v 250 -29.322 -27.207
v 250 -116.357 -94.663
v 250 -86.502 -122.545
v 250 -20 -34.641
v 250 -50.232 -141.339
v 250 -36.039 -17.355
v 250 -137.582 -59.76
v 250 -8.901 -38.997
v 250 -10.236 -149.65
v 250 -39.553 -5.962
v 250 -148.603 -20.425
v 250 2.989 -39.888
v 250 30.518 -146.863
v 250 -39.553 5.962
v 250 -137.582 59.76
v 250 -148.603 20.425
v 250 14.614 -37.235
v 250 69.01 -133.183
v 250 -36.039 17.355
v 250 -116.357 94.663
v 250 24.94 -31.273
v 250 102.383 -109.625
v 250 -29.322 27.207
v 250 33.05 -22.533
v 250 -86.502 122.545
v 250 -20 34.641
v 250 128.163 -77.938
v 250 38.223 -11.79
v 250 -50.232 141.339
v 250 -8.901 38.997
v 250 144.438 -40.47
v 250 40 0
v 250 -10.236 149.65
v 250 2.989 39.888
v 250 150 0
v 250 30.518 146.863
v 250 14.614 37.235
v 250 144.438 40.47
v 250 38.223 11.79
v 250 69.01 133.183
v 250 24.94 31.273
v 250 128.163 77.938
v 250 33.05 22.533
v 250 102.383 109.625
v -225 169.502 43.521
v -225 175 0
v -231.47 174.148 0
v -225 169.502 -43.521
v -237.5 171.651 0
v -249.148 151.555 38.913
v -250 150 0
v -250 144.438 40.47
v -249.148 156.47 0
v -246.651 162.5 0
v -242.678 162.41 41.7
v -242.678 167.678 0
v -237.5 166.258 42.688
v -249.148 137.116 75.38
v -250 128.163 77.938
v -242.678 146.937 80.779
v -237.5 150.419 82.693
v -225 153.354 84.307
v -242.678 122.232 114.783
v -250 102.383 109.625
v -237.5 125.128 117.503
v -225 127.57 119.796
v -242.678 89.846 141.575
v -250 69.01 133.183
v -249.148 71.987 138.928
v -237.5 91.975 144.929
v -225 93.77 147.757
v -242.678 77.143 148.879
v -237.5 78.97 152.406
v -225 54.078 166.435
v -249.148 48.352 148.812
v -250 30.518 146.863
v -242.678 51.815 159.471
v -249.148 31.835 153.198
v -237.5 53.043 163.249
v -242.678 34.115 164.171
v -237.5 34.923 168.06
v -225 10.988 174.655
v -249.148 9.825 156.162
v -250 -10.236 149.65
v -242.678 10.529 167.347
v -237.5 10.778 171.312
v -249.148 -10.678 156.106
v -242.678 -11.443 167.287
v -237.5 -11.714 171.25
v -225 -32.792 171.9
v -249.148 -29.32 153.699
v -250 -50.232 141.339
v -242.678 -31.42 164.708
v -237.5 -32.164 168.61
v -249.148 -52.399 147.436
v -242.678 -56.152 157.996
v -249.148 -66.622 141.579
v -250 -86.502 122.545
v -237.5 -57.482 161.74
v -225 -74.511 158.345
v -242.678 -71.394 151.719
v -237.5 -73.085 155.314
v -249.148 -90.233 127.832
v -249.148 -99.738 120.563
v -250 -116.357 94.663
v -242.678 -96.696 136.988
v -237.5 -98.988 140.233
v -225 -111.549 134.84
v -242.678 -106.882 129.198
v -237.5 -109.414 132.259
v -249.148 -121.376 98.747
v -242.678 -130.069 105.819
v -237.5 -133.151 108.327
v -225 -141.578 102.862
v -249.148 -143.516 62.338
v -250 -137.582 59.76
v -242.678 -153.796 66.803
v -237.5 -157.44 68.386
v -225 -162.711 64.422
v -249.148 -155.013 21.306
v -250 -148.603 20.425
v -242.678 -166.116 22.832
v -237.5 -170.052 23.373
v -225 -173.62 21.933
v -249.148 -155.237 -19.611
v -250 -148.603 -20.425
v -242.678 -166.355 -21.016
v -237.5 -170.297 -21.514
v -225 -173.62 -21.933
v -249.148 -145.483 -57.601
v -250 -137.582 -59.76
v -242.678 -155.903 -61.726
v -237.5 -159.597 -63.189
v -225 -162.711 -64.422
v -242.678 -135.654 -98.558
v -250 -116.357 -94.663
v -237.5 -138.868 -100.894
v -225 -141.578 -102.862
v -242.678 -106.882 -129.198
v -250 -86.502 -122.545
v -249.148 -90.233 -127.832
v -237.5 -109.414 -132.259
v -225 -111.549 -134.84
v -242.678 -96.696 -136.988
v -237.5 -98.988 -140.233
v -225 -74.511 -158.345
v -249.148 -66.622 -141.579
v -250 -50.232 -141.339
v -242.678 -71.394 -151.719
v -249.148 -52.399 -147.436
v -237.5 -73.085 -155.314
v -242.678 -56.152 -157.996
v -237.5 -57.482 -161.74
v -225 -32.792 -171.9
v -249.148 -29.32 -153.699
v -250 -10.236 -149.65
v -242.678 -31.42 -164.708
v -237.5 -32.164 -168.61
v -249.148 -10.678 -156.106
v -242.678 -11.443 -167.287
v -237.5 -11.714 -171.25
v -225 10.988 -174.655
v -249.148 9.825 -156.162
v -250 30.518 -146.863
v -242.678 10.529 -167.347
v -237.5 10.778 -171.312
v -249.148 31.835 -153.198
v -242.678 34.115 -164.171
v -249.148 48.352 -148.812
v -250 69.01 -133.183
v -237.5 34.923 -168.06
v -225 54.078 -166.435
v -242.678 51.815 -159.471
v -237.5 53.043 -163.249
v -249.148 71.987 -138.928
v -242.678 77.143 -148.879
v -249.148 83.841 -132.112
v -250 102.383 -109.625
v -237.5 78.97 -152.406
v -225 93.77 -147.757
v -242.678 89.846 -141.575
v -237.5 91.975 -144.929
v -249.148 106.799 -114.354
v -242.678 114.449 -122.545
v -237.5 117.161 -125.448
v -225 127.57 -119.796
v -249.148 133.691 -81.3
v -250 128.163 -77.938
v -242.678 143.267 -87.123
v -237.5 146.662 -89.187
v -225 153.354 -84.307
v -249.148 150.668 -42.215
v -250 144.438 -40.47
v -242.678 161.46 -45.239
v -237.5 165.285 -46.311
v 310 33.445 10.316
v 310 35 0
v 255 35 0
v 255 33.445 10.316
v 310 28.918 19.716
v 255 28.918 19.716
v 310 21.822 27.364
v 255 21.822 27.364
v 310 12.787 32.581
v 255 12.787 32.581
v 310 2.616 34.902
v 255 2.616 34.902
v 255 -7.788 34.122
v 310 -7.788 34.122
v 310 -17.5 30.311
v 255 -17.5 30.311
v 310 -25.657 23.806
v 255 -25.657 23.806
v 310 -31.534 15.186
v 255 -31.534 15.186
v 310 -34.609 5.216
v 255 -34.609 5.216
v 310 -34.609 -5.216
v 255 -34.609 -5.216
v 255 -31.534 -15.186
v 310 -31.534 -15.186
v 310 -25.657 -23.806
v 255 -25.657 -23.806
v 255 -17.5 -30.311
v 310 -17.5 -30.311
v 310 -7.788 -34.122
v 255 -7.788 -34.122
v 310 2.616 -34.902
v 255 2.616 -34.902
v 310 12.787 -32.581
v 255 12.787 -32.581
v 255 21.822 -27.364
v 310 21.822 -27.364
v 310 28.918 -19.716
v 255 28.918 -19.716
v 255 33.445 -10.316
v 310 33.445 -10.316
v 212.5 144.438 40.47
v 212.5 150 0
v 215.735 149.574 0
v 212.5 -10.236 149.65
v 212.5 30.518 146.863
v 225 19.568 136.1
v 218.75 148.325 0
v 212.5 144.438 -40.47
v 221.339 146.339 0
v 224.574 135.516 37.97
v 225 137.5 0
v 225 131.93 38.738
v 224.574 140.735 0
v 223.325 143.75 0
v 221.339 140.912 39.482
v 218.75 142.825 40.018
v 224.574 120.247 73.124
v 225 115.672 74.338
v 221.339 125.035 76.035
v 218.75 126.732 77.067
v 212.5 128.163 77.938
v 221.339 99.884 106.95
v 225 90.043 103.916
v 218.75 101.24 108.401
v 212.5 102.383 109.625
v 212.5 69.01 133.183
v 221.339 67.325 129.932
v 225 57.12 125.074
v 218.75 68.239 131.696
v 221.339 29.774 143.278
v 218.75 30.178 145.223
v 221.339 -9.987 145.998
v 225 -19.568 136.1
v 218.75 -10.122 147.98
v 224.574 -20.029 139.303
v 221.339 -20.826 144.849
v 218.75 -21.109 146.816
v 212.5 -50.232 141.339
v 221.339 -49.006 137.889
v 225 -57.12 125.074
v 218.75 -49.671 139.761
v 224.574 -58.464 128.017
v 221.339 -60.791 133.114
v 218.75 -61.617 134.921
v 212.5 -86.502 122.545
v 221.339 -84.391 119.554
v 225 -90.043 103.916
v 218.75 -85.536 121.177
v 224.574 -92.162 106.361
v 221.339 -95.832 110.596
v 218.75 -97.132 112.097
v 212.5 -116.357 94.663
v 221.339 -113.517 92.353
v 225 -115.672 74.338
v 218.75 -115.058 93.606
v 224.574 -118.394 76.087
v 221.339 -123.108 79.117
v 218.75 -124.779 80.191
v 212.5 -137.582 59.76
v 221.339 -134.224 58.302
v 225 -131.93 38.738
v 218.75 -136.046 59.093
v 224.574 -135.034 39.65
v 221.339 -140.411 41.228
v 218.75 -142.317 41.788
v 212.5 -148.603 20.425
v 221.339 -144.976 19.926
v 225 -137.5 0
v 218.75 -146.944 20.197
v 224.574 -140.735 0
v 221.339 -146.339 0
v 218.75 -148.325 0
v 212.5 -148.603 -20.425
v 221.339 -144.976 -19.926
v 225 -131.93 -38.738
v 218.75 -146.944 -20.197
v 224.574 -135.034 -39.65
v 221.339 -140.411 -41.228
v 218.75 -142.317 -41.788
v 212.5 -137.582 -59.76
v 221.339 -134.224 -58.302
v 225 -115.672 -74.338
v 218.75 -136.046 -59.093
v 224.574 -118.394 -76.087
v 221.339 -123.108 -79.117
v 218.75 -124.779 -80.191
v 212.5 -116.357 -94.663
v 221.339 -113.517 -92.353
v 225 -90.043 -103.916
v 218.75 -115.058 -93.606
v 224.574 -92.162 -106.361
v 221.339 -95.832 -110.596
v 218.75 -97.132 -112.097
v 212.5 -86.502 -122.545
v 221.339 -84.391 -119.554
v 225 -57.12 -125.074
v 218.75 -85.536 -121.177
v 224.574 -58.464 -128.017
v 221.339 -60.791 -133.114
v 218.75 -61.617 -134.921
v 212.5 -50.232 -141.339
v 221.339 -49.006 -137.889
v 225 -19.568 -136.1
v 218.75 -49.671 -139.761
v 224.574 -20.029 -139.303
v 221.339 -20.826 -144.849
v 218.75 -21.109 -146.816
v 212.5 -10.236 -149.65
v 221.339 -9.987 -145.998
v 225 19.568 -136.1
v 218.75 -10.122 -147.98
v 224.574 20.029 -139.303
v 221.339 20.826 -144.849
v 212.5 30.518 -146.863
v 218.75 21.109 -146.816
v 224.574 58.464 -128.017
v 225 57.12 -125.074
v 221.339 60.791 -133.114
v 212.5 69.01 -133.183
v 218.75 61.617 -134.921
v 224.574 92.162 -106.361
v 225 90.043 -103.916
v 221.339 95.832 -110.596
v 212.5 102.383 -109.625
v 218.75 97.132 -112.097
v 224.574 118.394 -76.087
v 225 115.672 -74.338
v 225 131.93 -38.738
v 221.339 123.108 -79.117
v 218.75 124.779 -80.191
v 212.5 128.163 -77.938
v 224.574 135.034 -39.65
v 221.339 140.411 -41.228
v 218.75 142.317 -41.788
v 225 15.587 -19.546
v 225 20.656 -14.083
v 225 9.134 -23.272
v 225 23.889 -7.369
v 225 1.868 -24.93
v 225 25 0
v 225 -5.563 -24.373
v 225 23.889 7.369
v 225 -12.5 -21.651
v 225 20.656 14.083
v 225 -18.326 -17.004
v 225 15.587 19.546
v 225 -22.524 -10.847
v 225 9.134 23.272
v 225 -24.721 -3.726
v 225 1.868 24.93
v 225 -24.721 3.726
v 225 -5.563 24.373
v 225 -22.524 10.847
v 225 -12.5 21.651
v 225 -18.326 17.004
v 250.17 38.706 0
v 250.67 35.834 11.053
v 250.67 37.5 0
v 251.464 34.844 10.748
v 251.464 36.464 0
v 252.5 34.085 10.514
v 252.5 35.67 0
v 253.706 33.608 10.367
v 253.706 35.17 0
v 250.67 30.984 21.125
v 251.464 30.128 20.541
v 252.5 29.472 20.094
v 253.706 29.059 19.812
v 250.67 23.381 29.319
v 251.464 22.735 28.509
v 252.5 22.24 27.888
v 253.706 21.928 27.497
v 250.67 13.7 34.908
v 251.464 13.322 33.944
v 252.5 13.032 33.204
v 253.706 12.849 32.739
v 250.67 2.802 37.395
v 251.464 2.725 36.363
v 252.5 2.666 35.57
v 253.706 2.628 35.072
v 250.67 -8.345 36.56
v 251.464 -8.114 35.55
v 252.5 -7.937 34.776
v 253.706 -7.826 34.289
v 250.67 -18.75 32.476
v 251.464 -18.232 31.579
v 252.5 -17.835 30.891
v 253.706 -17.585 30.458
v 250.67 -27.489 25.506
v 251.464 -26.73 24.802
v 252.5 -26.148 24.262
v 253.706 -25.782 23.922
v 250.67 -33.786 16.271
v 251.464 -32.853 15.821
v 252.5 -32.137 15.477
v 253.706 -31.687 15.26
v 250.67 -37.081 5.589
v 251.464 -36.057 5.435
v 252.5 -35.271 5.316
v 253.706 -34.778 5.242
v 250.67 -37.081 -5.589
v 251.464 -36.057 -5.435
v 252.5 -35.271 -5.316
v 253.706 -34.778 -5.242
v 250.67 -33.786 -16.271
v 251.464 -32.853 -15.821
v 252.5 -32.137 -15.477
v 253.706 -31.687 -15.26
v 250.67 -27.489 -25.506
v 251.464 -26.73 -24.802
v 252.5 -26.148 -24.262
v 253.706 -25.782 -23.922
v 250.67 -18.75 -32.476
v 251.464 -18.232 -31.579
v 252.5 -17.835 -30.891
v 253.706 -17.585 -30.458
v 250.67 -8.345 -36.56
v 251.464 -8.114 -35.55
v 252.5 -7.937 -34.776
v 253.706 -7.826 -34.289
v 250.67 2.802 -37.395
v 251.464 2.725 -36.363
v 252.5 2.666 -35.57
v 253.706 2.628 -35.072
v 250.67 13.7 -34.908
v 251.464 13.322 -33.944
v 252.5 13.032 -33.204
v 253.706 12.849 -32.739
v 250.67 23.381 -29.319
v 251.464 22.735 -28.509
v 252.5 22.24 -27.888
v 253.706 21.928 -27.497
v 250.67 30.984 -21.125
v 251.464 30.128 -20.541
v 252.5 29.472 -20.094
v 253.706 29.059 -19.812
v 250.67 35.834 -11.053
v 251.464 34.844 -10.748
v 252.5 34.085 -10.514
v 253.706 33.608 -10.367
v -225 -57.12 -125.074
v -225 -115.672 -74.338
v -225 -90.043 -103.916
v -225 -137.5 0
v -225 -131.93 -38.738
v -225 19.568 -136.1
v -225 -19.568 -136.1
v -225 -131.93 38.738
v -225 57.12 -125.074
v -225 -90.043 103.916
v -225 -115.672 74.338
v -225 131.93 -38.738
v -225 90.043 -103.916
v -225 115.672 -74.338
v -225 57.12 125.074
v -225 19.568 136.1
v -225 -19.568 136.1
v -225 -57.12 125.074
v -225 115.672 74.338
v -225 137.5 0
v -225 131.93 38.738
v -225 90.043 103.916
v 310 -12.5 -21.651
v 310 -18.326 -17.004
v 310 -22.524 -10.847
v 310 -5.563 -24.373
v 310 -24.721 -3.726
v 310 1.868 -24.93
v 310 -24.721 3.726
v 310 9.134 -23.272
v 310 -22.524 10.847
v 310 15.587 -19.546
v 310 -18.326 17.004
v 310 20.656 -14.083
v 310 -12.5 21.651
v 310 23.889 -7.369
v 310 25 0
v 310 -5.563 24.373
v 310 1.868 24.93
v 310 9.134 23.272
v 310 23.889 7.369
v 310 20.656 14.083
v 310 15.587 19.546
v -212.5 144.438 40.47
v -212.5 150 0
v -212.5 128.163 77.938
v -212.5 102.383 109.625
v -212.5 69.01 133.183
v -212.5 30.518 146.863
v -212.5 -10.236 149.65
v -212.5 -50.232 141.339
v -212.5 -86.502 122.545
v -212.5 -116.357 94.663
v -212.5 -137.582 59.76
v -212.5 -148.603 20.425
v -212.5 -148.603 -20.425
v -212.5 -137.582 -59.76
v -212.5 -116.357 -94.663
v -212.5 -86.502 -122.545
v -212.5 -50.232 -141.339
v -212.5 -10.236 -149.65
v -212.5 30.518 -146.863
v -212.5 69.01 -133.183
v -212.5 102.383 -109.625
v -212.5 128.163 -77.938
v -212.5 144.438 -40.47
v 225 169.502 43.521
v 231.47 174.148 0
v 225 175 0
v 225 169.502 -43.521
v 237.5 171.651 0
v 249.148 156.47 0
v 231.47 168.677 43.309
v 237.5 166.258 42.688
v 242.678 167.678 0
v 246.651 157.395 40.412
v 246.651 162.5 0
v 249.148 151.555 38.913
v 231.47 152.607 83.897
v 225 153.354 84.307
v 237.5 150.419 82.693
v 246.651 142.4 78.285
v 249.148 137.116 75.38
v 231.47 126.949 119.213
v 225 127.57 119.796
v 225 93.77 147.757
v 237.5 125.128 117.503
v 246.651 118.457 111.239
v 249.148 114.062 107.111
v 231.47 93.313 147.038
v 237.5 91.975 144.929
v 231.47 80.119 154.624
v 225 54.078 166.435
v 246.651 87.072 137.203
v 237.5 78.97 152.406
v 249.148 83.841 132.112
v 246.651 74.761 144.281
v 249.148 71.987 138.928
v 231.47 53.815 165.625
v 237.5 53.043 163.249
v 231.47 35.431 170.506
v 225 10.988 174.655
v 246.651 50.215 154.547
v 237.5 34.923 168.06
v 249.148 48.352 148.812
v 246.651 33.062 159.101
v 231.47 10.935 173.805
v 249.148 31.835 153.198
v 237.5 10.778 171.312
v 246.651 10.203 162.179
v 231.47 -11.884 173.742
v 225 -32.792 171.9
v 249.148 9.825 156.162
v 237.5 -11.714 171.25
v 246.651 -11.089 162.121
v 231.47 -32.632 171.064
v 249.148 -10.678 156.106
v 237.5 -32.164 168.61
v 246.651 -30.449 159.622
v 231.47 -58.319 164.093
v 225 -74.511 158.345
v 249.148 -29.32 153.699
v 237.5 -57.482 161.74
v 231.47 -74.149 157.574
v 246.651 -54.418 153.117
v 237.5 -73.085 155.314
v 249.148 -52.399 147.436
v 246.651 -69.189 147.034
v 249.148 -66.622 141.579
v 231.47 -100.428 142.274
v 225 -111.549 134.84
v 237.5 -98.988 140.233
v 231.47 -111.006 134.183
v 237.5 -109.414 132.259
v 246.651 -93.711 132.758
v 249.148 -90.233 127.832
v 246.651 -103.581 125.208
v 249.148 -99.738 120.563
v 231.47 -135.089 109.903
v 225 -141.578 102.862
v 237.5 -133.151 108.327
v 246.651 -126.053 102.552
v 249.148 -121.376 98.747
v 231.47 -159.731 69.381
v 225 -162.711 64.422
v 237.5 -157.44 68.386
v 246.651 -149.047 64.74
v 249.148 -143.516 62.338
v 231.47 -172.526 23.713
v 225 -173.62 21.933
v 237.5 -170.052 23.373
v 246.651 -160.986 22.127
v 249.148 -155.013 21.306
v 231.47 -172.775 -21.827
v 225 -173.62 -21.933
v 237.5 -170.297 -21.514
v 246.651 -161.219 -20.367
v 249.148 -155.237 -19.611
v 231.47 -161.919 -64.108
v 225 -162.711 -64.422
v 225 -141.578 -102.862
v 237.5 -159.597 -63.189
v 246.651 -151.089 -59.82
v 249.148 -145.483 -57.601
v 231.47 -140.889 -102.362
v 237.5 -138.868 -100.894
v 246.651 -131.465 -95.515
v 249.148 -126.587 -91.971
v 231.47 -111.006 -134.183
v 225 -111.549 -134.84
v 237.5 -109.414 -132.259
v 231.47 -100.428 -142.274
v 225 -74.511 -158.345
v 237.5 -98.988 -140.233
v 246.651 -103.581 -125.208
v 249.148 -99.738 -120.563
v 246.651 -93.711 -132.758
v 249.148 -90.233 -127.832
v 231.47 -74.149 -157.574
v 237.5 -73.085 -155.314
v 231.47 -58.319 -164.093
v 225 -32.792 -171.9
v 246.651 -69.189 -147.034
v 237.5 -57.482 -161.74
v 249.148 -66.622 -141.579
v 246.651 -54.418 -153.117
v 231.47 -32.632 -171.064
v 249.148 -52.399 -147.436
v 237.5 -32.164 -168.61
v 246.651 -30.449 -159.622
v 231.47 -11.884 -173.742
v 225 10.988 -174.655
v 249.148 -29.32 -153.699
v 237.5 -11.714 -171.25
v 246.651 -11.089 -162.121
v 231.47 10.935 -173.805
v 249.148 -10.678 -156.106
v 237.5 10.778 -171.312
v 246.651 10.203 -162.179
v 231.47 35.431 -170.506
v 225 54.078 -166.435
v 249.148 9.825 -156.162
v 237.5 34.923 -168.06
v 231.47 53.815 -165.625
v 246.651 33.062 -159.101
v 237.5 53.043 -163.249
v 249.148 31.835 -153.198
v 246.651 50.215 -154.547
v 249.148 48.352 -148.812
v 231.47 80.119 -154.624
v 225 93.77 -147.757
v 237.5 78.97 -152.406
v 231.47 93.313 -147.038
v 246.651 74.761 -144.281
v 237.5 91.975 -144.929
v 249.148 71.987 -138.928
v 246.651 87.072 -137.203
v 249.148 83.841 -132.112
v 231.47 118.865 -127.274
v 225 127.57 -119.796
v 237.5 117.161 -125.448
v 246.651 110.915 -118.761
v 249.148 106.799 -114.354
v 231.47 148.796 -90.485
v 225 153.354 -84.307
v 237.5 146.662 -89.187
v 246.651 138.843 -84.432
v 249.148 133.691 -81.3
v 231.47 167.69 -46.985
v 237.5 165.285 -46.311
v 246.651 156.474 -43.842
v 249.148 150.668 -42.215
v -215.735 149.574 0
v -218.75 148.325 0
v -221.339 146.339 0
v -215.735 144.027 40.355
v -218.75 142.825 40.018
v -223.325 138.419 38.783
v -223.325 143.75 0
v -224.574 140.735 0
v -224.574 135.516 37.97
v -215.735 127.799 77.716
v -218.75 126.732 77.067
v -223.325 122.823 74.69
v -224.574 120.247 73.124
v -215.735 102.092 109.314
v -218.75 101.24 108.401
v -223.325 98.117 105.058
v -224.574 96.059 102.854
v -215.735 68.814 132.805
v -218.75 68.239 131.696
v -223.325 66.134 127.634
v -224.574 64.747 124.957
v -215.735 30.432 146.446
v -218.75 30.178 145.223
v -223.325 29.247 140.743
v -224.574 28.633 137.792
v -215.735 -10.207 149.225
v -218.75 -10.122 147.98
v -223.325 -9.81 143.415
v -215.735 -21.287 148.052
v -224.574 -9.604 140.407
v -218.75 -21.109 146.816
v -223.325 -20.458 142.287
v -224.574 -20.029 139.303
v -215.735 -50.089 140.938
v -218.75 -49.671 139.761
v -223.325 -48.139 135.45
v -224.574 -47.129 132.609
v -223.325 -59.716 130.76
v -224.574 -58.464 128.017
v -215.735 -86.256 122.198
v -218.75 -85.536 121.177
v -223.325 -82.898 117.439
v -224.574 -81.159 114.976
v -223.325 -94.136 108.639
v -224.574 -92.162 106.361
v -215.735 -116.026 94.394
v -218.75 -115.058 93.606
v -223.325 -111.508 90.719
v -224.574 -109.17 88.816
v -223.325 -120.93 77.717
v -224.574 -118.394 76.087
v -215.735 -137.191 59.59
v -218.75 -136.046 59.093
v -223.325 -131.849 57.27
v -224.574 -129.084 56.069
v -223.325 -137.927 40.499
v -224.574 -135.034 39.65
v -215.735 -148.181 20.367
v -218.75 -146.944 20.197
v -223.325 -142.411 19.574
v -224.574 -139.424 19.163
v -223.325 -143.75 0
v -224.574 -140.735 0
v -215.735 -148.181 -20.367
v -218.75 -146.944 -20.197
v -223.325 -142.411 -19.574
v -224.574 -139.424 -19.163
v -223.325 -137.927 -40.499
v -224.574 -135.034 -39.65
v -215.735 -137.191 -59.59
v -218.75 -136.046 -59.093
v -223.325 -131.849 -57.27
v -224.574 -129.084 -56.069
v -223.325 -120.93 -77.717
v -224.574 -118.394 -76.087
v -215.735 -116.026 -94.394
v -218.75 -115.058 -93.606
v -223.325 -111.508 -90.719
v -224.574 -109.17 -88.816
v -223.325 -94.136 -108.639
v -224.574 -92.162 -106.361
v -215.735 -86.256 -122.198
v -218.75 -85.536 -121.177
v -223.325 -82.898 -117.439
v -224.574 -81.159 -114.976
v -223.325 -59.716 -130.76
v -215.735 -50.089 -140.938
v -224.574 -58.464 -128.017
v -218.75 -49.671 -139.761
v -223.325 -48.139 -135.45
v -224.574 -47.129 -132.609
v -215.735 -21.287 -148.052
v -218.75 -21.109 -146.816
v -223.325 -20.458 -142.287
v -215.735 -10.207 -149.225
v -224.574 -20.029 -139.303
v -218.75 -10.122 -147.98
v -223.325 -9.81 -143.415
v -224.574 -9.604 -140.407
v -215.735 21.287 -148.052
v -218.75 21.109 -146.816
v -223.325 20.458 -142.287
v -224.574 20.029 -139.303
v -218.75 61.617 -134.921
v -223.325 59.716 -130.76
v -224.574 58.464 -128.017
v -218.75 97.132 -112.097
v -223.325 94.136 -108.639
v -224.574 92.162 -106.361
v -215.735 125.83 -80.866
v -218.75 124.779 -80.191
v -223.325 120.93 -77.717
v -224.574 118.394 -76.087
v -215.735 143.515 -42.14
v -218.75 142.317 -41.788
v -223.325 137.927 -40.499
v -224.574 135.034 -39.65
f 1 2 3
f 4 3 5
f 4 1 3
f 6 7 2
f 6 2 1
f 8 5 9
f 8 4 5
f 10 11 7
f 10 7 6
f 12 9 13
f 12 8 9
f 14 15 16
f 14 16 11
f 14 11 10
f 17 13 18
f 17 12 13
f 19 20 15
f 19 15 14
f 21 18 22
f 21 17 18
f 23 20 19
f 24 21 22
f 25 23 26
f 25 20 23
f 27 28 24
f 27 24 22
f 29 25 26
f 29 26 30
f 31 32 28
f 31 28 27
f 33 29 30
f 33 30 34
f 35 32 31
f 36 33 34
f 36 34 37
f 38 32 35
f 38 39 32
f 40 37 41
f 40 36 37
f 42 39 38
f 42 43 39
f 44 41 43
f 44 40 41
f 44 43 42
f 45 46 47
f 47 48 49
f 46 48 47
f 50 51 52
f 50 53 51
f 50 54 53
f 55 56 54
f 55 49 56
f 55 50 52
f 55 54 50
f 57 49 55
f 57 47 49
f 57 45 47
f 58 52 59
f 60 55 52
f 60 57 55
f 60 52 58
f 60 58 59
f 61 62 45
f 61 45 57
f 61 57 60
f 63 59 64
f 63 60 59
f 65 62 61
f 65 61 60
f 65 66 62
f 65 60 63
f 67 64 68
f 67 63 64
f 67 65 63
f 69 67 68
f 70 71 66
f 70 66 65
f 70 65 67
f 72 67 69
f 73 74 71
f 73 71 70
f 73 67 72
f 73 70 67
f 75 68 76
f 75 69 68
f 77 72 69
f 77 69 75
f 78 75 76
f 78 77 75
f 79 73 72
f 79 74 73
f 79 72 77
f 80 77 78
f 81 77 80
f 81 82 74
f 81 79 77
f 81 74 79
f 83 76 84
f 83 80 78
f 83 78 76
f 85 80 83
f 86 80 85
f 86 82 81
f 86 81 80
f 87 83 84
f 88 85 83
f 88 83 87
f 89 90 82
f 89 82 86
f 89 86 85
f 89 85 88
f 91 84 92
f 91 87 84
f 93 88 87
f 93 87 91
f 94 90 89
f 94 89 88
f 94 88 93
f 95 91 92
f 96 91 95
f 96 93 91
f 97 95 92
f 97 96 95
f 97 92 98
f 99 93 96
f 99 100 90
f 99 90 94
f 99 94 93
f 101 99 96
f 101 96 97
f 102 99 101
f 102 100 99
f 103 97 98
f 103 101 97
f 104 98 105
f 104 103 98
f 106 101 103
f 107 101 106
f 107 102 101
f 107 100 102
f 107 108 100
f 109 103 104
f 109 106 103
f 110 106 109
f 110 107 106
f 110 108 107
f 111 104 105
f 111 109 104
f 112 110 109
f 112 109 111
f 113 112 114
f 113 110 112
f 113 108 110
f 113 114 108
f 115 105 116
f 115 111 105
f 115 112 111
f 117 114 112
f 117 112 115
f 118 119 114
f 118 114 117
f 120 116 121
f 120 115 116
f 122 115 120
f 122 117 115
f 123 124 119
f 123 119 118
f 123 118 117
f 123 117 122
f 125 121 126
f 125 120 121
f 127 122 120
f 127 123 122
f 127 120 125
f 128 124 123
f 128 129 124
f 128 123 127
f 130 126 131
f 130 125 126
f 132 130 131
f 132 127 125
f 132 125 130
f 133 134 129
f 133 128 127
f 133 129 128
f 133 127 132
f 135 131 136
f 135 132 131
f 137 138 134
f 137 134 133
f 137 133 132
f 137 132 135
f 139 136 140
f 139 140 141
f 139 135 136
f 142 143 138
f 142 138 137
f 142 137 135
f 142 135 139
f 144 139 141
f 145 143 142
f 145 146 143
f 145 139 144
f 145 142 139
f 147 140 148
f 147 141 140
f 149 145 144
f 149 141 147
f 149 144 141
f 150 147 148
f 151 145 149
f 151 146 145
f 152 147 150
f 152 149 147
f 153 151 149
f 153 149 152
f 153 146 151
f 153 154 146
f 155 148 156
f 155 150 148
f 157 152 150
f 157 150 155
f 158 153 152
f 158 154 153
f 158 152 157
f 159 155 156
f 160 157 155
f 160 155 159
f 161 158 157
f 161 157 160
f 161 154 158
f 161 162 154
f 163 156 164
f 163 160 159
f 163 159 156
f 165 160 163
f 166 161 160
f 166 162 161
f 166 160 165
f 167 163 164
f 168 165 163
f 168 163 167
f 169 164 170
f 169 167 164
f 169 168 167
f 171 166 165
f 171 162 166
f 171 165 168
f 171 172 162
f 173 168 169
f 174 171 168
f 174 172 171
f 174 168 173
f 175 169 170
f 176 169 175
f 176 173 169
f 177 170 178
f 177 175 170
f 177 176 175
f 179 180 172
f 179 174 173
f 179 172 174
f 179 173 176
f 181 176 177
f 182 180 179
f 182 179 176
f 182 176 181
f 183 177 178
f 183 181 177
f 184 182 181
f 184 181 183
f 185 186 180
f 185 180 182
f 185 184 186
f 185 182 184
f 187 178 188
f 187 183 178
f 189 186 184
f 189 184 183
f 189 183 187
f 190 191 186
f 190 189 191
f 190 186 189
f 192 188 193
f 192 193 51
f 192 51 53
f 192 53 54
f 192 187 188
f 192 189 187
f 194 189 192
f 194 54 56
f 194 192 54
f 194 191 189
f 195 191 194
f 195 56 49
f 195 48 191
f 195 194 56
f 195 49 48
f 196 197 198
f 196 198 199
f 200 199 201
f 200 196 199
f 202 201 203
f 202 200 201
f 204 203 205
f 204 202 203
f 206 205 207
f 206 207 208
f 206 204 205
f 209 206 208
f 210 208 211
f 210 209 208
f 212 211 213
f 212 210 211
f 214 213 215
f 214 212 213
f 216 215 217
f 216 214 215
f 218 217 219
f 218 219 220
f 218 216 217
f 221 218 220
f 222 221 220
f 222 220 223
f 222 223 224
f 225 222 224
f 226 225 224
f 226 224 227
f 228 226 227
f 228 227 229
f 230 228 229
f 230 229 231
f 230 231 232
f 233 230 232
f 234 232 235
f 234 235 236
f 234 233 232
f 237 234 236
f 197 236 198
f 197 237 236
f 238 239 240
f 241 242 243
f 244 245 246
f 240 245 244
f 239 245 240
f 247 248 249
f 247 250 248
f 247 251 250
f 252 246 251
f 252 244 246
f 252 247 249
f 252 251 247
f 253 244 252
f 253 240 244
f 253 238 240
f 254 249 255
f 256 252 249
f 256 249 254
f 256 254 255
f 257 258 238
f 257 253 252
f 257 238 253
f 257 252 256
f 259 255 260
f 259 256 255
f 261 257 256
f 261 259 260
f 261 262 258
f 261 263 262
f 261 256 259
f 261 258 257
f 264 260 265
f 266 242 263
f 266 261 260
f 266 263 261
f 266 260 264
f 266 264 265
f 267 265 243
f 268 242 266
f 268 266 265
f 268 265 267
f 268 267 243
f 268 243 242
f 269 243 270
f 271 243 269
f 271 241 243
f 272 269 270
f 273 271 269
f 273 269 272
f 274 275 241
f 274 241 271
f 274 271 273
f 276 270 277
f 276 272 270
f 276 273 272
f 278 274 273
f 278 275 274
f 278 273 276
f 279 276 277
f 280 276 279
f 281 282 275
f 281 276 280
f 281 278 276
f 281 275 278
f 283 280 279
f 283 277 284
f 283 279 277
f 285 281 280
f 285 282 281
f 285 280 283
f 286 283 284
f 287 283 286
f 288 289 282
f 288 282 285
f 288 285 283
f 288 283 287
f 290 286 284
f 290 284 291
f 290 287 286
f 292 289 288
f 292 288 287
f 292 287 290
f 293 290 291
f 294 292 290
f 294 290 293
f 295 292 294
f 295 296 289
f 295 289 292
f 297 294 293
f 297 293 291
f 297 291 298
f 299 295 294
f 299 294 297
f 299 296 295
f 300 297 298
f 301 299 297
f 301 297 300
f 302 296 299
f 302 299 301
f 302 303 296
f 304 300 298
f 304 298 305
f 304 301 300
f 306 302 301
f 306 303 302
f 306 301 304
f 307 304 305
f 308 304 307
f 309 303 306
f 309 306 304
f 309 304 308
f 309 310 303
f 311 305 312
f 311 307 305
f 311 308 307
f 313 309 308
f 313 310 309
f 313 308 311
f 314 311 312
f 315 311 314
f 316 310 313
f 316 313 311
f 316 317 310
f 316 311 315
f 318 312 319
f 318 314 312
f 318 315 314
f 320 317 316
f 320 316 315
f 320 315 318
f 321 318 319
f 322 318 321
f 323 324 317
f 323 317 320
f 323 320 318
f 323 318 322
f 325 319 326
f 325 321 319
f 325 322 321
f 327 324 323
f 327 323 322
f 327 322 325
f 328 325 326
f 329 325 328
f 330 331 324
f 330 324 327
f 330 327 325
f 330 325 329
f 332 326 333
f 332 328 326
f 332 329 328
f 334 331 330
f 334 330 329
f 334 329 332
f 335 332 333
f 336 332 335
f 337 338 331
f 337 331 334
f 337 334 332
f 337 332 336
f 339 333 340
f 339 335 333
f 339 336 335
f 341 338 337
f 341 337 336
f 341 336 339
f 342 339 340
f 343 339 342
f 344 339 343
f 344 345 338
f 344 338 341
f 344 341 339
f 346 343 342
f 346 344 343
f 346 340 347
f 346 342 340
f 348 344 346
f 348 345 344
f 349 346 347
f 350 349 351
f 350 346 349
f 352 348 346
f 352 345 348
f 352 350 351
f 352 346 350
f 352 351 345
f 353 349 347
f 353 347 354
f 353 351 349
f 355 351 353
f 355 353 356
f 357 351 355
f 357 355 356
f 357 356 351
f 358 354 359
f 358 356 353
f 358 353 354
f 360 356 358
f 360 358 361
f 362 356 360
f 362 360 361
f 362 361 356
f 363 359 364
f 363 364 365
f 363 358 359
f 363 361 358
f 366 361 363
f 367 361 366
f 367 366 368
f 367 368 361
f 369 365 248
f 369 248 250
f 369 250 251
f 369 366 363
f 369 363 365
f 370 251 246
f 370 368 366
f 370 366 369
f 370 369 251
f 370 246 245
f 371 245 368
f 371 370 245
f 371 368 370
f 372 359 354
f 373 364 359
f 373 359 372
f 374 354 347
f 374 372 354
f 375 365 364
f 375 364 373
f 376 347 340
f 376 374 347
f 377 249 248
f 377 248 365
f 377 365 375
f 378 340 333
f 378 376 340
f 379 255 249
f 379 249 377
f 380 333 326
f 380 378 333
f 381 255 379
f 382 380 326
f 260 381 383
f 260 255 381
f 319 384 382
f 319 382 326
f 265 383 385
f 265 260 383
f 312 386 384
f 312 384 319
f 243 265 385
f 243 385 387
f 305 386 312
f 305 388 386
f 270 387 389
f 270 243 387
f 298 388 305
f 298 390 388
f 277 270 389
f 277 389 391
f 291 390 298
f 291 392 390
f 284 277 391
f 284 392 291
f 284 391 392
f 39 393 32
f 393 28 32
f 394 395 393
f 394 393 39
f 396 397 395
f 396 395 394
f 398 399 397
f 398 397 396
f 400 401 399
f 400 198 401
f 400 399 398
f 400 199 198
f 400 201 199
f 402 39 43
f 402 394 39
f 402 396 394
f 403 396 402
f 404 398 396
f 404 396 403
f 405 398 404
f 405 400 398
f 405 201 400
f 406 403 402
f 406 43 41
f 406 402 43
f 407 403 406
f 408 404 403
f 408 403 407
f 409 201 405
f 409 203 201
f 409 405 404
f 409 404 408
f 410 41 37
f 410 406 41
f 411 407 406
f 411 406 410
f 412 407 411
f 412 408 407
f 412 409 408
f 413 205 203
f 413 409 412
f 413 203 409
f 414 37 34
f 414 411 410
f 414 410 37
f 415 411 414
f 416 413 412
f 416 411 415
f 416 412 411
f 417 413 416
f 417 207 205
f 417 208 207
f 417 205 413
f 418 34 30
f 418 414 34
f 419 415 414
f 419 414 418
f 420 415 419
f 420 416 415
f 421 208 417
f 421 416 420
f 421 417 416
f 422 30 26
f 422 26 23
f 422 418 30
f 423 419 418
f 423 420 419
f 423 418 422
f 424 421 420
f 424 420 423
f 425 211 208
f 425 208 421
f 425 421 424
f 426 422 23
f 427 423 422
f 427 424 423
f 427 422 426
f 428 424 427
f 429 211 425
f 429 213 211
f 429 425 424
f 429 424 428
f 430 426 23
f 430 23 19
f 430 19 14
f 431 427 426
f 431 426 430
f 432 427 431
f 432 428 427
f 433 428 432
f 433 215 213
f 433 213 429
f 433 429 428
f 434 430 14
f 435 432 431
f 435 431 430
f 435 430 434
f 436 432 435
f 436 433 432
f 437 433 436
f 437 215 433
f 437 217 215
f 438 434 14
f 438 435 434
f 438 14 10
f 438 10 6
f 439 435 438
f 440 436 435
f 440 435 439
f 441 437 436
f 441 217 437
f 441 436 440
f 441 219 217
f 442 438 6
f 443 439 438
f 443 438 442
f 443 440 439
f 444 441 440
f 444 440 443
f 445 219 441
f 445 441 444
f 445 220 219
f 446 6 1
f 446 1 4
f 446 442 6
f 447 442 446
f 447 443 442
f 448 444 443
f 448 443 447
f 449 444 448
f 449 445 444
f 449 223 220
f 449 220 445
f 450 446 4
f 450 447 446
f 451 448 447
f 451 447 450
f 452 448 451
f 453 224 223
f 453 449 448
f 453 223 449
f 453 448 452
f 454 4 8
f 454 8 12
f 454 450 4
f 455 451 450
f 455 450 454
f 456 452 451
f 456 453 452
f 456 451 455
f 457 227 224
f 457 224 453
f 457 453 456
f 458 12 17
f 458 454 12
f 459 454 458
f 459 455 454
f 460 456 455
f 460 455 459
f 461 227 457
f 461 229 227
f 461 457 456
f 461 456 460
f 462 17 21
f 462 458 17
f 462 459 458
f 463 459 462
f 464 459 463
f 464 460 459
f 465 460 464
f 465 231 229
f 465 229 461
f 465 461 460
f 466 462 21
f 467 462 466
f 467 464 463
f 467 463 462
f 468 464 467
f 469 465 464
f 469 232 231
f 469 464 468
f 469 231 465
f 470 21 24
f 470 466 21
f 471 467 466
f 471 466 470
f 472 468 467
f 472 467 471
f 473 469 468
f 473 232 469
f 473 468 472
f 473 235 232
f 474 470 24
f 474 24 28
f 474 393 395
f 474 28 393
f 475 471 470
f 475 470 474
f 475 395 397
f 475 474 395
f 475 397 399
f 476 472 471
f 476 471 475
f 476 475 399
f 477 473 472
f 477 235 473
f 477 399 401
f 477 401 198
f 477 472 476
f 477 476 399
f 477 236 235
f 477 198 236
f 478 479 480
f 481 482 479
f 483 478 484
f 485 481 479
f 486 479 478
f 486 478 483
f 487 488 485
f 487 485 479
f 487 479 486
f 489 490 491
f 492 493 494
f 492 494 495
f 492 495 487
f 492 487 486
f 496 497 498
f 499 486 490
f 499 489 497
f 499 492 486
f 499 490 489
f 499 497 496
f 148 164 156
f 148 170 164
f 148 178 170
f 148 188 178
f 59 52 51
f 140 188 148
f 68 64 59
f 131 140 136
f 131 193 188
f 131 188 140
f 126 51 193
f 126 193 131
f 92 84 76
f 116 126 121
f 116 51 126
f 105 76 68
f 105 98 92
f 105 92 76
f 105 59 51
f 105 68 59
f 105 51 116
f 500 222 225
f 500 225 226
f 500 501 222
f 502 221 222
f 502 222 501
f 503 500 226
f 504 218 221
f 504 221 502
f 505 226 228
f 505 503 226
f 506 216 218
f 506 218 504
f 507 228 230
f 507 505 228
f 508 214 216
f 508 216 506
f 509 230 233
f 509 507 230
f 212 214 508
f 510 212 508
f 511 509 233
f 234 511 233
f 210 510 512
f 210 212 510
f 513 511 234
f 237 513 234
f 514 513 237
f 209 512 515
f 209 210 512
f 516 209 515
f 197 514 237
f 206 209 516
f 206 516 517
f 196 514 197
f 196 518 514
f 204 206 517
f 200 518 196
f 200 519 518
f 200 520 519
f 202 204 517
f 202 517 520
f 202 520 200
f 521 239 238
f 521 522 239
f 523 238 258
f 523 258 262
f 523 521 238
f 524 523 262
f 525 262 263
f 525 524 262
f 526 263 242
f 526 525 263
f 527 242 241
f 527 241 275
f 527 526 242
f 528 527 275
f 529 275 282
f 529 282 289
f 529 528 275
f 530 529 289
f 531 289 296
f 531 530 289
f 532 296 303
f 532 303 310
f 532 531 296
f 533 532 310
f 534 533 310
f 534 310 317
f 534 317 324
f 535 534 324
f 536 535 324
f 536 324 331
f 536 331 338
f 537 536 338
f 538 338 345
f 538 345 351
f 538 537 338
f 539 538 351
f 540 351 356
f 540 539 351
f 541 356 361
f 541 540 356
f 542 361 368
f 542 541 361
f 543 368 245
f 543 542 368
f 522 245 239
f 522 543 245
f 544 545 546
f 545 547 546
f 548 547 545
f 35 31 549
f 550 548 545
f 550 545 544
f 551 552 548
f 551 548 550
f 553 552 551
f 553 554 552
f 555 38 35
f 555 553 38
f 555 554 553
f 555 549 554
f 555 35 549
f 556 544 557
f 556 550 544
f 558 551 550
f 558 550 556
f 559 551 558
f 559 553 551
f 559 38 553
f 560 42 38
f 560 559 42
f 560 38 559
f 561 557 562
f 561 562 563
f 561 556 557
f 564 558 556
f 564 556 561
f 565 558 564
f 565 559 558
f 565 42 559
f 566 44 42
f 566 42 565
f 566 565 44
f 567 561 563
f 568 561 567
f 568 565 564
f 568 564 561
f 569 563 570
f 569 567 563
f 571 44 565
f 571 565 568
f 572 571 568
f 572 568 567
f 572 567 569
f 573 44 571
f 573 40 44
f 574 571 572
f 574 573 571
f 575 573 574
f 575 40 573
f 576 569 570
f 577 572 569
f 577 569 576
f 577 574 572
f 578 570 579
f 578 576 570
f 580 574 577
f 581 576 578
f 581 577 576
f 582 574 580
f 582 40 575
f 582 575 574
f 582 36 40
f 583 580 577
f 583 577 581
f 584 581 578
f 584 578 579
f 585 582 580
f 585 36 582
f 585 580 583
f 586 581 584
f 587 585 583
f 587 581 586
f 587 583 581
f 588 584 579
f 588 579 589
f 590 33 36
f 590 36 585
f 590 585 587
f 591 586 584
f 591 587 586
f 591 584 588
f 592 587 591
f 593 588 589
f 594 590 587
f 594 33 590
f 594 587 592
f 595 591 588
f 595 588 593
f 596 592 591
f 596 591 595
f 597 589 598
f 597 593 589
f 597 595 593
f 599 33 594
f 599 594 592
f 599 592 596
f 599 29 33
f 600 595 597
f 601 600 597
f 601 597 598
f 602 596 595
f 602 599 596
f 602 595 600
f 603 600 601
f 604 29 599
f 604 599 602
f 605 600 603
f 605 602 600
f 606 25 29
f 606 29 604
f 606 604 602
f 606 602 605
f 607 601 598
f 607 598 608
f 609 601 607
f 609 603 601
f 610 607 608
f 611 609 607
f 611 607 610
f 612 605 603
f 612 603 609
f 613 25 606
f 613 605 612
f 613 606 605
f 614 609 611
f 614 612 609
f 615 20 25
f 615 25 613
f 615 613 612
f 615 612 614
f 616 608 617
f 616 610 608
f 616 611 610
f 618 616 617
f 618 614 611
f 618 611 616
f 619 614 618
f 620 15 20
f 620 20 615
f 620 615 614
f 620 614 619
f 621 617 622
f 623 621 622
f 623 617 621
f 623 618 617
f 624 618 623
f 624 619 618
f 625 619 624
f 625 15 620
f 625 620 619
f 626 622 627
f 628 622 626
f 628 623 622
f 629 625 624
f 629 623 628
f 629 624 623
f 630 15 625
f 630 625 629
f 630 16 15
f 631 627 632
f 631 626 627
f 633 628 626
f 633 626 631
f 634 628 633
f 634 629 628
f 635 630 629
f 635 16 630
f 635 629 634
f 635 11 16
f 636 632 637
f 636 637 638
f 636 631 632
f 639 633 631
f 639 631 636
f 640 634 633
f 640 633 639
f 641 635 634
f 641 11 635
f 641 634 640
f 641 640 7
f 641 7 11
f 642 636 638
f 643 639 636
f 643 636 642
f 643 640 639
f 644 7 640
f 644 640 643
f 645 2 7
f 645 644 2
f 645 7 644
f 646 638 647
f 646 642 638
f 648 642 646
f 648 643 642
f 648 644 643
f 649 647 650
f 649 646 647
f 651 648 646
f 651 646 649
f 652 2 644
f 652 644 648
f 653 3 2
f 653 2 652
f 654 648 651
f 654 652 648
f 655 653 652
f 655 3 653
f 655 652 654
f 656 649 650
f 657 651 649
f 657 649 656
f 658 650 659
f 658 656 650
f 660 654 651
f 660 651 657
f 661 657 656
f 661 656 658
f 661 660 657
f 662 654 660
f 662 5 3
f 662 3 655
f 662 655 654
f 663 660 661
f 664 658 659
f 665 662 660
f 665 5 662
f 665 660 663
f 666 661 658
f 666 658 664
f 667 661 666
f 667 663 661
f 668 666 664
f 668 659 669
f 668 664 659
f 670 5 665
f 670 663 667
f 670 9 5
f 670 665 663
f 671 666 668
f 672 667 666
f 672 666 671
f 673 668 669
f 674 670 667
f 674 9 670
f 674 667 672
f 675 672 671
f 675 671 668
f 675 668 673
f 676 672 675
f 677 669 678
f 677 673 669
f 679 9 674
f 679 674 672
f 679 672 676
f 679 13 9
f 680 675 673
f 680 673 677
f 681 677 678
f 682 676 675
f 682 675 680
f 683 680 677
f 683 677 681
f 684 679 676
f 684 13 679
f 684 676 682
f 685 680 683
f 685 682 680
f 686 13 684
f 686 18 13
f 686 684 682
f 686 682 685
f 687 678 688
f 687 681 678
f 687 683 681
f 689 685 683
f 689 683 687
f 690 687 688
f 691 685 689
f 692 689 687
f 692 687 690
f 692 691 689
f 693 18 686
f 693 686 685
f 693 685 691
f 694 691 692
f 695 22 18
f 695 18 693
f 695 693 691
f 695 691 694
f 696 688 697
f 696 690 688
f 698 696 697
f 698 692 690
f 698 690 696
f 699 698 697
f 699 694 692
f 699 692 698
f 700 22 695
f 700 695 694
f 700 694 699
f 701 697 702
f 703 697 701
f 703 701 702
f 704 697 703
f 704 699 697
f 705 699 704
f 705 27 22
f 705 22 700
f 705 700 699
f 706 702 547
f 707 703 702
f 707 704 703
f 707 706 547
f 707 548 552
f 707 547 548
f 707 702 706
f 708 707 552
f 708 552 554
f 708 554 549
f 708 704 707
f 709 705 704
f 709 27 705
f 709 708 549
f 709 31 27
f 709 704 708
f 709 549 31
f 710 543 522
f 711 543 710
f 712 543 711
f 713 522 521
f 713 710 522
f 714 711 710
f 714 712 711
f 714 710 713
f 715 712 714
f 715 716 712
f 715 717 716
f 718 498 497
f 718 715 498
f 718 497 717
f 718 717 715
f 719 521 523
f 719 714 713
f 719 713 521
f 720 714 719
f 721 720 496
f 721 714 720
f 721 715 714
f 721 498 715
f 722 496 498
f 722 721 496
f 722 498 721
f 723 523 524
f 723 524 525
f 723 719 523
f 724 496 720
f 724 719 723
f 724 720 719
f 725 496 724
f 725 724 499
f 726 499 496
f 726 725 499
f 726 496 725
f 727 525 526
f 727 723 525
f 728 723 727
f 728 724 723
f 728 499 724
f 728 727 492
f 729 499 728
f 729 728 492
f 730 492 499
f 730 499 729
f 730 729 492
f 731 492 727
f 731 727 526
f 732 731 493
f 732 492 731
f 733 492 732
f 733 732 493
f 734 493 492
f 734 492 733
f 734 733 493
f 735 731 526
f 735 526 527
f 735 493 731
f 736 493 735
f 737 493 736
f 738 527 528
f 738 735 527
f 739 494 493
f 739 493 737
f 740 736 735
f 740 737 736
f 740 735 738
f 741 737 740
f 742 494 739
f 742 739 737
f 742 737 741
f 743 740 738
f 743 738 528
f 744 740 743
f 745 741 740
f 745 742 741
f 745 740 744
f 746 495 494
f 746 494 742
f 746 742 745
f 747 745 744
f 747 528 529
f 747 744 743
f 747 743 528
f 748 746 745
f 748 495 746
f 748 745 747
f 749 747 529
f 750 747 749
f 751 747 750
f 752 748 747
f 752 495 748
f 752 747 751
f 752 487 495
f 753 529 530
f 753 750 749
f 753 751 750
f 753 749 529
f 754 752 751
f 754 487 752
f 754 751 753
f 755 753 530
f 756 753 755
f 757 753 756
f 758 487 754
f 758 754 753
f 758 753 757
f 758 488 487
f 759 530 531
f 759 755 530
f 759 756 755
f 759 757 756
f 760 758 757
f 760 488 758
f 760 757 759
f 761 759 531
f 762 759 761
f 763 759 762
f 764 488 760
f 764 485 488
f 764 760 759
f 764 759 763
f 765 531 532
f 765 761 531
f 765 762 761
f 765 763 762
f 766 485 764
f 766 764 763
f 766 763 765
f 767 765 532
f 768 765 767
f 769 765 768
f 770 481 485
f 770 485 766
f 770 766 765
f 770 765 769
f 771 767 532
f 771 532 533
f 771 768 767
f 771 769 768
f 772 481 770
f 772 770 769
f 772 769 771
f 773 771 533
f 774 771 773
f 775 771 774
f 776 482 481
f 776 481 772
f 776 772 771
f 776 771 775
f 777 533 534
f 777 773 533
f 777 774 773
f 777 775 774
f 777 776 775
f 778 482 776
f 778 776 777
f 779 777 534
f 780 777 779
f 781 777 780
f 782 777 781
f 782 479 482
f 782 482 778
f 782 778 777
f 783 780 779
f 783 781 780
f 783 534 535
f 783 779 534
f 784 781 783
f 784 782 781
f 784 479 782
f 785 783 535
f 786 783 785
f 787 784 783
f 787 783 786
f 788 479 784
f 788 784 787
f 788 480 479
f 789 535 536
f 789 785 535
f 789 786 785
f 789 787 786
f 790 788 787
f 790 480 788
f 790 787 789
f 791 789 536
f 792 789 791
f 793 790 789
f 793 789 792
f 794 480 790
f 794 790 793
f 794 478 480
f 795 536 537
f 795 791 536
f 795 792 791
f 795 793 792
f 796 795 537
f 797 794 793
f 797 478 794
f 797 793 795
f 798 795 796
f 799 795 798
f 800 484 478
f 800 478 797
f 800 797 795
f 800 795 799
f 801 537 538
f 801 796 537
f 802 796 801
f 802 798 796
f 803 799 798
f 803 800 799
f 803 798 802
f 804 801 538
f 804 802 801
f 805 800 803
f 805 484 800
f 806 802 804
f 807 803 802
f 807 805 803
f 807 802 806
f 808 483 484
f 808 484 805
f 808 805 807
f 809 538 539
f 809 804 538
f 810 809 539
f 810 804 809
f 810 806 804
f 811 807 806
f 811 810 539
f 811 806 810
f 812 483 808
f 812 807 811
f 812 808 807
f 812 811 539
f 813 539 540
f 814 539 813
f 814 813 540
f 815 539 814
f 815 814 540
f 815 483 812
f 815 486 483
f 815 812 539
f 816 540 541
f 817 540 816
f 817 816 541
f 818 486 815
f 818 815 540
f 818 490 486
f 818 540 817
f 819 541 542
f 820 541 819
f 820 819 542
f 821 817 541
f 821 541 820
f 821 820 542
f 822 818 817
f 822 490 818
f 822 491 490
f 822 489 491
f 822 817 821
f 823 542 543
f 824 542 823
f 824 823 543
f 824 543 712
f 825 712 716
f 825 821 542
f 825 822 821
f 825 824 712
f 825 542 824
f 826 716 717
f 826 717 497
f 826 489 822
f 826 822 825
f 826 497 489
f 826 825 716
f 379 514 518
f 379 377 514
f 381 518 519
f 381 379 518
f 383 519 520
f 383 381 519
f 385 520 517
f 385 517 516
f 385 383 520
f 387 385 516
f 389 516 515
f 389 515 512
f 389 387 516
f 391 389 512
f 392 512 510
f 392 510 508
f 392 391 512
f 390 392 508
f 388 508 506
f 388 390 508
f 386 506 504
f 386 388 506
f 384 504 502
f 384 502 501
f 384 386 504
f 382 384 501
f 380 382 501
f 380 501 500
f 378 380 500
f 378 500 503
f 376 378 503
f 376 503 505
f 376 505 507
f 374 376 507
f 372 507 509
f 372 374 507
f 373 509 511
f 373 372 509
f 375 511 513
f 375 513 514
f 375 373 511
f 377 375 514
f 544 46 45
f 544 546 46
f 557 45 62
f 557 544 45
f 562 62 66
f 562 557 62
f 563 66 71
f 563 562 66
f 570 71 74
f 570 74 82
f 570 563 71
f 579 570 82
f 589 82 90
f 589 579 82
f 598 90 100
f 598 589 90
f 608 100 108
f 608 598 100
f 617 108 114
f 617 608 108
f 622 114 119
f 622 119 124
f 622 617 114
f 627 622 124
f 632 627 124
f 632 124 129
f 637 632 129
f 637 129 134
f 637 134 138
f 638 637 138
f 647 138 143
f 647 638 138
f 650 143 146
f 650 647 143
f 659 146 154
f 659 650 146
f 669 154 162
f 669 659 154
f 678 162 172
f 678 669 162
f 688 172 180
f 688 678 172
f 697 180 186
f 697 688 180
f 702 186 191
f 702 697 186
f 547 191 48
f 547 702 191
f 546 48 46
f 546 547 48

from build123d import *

# Parameters (mm, degrees)
PIPE_CONNECTOR_FILLET_R = 5


with BuildPart() as part:
    # Sketch1 → Revolve1 (revolve)
    with BuildSketch(Plane.XY):
        with BuildLine():
            Line((-225, 175), (225, 175))
            ThreePointArc((225, 175), (242.67766953, 167.67766953), (250, 150))
            Line((250, 150), (250, 35))
            Line((250, 35), (310, 35))
            Line((310, 35), (310, 25))
            Line((310, 25), (225, 25))
            Line((225, 25), (225, 137.5))
            ThreePointArc((225, 137.5), (221.338834765, 146.338834765), (212.5, 150))
            Line((212.5, 150), (-212.5, 150))
            ThreePointArc((-212.5, 150), (-221.338834765, 146.338834765), (-225, 137.5))
            Line((-225, 137.5), (-225, 0))
            Line((-225, 0), (-250, 0))
            Line((-250, 0), (-250, 150))
            ThreePointArc((-250, 150), (-242.67766953, 167.67766953), (-225, 175))
        make_face()
    revolve(axis=Axis((-162.28666216, 0, 0), (1, 0, 0)))

    # Pipe Connector Fillet
    pipe_connector_fillet_edges = [part.edges().sort_by_distance(p)[0] for p in [
        (250, -35, 0),
    ]]
    fillet(pipe_connector_fillet_edges, radius=PIPE_CONNECTOR_FILLET_R)


solid = part.part
